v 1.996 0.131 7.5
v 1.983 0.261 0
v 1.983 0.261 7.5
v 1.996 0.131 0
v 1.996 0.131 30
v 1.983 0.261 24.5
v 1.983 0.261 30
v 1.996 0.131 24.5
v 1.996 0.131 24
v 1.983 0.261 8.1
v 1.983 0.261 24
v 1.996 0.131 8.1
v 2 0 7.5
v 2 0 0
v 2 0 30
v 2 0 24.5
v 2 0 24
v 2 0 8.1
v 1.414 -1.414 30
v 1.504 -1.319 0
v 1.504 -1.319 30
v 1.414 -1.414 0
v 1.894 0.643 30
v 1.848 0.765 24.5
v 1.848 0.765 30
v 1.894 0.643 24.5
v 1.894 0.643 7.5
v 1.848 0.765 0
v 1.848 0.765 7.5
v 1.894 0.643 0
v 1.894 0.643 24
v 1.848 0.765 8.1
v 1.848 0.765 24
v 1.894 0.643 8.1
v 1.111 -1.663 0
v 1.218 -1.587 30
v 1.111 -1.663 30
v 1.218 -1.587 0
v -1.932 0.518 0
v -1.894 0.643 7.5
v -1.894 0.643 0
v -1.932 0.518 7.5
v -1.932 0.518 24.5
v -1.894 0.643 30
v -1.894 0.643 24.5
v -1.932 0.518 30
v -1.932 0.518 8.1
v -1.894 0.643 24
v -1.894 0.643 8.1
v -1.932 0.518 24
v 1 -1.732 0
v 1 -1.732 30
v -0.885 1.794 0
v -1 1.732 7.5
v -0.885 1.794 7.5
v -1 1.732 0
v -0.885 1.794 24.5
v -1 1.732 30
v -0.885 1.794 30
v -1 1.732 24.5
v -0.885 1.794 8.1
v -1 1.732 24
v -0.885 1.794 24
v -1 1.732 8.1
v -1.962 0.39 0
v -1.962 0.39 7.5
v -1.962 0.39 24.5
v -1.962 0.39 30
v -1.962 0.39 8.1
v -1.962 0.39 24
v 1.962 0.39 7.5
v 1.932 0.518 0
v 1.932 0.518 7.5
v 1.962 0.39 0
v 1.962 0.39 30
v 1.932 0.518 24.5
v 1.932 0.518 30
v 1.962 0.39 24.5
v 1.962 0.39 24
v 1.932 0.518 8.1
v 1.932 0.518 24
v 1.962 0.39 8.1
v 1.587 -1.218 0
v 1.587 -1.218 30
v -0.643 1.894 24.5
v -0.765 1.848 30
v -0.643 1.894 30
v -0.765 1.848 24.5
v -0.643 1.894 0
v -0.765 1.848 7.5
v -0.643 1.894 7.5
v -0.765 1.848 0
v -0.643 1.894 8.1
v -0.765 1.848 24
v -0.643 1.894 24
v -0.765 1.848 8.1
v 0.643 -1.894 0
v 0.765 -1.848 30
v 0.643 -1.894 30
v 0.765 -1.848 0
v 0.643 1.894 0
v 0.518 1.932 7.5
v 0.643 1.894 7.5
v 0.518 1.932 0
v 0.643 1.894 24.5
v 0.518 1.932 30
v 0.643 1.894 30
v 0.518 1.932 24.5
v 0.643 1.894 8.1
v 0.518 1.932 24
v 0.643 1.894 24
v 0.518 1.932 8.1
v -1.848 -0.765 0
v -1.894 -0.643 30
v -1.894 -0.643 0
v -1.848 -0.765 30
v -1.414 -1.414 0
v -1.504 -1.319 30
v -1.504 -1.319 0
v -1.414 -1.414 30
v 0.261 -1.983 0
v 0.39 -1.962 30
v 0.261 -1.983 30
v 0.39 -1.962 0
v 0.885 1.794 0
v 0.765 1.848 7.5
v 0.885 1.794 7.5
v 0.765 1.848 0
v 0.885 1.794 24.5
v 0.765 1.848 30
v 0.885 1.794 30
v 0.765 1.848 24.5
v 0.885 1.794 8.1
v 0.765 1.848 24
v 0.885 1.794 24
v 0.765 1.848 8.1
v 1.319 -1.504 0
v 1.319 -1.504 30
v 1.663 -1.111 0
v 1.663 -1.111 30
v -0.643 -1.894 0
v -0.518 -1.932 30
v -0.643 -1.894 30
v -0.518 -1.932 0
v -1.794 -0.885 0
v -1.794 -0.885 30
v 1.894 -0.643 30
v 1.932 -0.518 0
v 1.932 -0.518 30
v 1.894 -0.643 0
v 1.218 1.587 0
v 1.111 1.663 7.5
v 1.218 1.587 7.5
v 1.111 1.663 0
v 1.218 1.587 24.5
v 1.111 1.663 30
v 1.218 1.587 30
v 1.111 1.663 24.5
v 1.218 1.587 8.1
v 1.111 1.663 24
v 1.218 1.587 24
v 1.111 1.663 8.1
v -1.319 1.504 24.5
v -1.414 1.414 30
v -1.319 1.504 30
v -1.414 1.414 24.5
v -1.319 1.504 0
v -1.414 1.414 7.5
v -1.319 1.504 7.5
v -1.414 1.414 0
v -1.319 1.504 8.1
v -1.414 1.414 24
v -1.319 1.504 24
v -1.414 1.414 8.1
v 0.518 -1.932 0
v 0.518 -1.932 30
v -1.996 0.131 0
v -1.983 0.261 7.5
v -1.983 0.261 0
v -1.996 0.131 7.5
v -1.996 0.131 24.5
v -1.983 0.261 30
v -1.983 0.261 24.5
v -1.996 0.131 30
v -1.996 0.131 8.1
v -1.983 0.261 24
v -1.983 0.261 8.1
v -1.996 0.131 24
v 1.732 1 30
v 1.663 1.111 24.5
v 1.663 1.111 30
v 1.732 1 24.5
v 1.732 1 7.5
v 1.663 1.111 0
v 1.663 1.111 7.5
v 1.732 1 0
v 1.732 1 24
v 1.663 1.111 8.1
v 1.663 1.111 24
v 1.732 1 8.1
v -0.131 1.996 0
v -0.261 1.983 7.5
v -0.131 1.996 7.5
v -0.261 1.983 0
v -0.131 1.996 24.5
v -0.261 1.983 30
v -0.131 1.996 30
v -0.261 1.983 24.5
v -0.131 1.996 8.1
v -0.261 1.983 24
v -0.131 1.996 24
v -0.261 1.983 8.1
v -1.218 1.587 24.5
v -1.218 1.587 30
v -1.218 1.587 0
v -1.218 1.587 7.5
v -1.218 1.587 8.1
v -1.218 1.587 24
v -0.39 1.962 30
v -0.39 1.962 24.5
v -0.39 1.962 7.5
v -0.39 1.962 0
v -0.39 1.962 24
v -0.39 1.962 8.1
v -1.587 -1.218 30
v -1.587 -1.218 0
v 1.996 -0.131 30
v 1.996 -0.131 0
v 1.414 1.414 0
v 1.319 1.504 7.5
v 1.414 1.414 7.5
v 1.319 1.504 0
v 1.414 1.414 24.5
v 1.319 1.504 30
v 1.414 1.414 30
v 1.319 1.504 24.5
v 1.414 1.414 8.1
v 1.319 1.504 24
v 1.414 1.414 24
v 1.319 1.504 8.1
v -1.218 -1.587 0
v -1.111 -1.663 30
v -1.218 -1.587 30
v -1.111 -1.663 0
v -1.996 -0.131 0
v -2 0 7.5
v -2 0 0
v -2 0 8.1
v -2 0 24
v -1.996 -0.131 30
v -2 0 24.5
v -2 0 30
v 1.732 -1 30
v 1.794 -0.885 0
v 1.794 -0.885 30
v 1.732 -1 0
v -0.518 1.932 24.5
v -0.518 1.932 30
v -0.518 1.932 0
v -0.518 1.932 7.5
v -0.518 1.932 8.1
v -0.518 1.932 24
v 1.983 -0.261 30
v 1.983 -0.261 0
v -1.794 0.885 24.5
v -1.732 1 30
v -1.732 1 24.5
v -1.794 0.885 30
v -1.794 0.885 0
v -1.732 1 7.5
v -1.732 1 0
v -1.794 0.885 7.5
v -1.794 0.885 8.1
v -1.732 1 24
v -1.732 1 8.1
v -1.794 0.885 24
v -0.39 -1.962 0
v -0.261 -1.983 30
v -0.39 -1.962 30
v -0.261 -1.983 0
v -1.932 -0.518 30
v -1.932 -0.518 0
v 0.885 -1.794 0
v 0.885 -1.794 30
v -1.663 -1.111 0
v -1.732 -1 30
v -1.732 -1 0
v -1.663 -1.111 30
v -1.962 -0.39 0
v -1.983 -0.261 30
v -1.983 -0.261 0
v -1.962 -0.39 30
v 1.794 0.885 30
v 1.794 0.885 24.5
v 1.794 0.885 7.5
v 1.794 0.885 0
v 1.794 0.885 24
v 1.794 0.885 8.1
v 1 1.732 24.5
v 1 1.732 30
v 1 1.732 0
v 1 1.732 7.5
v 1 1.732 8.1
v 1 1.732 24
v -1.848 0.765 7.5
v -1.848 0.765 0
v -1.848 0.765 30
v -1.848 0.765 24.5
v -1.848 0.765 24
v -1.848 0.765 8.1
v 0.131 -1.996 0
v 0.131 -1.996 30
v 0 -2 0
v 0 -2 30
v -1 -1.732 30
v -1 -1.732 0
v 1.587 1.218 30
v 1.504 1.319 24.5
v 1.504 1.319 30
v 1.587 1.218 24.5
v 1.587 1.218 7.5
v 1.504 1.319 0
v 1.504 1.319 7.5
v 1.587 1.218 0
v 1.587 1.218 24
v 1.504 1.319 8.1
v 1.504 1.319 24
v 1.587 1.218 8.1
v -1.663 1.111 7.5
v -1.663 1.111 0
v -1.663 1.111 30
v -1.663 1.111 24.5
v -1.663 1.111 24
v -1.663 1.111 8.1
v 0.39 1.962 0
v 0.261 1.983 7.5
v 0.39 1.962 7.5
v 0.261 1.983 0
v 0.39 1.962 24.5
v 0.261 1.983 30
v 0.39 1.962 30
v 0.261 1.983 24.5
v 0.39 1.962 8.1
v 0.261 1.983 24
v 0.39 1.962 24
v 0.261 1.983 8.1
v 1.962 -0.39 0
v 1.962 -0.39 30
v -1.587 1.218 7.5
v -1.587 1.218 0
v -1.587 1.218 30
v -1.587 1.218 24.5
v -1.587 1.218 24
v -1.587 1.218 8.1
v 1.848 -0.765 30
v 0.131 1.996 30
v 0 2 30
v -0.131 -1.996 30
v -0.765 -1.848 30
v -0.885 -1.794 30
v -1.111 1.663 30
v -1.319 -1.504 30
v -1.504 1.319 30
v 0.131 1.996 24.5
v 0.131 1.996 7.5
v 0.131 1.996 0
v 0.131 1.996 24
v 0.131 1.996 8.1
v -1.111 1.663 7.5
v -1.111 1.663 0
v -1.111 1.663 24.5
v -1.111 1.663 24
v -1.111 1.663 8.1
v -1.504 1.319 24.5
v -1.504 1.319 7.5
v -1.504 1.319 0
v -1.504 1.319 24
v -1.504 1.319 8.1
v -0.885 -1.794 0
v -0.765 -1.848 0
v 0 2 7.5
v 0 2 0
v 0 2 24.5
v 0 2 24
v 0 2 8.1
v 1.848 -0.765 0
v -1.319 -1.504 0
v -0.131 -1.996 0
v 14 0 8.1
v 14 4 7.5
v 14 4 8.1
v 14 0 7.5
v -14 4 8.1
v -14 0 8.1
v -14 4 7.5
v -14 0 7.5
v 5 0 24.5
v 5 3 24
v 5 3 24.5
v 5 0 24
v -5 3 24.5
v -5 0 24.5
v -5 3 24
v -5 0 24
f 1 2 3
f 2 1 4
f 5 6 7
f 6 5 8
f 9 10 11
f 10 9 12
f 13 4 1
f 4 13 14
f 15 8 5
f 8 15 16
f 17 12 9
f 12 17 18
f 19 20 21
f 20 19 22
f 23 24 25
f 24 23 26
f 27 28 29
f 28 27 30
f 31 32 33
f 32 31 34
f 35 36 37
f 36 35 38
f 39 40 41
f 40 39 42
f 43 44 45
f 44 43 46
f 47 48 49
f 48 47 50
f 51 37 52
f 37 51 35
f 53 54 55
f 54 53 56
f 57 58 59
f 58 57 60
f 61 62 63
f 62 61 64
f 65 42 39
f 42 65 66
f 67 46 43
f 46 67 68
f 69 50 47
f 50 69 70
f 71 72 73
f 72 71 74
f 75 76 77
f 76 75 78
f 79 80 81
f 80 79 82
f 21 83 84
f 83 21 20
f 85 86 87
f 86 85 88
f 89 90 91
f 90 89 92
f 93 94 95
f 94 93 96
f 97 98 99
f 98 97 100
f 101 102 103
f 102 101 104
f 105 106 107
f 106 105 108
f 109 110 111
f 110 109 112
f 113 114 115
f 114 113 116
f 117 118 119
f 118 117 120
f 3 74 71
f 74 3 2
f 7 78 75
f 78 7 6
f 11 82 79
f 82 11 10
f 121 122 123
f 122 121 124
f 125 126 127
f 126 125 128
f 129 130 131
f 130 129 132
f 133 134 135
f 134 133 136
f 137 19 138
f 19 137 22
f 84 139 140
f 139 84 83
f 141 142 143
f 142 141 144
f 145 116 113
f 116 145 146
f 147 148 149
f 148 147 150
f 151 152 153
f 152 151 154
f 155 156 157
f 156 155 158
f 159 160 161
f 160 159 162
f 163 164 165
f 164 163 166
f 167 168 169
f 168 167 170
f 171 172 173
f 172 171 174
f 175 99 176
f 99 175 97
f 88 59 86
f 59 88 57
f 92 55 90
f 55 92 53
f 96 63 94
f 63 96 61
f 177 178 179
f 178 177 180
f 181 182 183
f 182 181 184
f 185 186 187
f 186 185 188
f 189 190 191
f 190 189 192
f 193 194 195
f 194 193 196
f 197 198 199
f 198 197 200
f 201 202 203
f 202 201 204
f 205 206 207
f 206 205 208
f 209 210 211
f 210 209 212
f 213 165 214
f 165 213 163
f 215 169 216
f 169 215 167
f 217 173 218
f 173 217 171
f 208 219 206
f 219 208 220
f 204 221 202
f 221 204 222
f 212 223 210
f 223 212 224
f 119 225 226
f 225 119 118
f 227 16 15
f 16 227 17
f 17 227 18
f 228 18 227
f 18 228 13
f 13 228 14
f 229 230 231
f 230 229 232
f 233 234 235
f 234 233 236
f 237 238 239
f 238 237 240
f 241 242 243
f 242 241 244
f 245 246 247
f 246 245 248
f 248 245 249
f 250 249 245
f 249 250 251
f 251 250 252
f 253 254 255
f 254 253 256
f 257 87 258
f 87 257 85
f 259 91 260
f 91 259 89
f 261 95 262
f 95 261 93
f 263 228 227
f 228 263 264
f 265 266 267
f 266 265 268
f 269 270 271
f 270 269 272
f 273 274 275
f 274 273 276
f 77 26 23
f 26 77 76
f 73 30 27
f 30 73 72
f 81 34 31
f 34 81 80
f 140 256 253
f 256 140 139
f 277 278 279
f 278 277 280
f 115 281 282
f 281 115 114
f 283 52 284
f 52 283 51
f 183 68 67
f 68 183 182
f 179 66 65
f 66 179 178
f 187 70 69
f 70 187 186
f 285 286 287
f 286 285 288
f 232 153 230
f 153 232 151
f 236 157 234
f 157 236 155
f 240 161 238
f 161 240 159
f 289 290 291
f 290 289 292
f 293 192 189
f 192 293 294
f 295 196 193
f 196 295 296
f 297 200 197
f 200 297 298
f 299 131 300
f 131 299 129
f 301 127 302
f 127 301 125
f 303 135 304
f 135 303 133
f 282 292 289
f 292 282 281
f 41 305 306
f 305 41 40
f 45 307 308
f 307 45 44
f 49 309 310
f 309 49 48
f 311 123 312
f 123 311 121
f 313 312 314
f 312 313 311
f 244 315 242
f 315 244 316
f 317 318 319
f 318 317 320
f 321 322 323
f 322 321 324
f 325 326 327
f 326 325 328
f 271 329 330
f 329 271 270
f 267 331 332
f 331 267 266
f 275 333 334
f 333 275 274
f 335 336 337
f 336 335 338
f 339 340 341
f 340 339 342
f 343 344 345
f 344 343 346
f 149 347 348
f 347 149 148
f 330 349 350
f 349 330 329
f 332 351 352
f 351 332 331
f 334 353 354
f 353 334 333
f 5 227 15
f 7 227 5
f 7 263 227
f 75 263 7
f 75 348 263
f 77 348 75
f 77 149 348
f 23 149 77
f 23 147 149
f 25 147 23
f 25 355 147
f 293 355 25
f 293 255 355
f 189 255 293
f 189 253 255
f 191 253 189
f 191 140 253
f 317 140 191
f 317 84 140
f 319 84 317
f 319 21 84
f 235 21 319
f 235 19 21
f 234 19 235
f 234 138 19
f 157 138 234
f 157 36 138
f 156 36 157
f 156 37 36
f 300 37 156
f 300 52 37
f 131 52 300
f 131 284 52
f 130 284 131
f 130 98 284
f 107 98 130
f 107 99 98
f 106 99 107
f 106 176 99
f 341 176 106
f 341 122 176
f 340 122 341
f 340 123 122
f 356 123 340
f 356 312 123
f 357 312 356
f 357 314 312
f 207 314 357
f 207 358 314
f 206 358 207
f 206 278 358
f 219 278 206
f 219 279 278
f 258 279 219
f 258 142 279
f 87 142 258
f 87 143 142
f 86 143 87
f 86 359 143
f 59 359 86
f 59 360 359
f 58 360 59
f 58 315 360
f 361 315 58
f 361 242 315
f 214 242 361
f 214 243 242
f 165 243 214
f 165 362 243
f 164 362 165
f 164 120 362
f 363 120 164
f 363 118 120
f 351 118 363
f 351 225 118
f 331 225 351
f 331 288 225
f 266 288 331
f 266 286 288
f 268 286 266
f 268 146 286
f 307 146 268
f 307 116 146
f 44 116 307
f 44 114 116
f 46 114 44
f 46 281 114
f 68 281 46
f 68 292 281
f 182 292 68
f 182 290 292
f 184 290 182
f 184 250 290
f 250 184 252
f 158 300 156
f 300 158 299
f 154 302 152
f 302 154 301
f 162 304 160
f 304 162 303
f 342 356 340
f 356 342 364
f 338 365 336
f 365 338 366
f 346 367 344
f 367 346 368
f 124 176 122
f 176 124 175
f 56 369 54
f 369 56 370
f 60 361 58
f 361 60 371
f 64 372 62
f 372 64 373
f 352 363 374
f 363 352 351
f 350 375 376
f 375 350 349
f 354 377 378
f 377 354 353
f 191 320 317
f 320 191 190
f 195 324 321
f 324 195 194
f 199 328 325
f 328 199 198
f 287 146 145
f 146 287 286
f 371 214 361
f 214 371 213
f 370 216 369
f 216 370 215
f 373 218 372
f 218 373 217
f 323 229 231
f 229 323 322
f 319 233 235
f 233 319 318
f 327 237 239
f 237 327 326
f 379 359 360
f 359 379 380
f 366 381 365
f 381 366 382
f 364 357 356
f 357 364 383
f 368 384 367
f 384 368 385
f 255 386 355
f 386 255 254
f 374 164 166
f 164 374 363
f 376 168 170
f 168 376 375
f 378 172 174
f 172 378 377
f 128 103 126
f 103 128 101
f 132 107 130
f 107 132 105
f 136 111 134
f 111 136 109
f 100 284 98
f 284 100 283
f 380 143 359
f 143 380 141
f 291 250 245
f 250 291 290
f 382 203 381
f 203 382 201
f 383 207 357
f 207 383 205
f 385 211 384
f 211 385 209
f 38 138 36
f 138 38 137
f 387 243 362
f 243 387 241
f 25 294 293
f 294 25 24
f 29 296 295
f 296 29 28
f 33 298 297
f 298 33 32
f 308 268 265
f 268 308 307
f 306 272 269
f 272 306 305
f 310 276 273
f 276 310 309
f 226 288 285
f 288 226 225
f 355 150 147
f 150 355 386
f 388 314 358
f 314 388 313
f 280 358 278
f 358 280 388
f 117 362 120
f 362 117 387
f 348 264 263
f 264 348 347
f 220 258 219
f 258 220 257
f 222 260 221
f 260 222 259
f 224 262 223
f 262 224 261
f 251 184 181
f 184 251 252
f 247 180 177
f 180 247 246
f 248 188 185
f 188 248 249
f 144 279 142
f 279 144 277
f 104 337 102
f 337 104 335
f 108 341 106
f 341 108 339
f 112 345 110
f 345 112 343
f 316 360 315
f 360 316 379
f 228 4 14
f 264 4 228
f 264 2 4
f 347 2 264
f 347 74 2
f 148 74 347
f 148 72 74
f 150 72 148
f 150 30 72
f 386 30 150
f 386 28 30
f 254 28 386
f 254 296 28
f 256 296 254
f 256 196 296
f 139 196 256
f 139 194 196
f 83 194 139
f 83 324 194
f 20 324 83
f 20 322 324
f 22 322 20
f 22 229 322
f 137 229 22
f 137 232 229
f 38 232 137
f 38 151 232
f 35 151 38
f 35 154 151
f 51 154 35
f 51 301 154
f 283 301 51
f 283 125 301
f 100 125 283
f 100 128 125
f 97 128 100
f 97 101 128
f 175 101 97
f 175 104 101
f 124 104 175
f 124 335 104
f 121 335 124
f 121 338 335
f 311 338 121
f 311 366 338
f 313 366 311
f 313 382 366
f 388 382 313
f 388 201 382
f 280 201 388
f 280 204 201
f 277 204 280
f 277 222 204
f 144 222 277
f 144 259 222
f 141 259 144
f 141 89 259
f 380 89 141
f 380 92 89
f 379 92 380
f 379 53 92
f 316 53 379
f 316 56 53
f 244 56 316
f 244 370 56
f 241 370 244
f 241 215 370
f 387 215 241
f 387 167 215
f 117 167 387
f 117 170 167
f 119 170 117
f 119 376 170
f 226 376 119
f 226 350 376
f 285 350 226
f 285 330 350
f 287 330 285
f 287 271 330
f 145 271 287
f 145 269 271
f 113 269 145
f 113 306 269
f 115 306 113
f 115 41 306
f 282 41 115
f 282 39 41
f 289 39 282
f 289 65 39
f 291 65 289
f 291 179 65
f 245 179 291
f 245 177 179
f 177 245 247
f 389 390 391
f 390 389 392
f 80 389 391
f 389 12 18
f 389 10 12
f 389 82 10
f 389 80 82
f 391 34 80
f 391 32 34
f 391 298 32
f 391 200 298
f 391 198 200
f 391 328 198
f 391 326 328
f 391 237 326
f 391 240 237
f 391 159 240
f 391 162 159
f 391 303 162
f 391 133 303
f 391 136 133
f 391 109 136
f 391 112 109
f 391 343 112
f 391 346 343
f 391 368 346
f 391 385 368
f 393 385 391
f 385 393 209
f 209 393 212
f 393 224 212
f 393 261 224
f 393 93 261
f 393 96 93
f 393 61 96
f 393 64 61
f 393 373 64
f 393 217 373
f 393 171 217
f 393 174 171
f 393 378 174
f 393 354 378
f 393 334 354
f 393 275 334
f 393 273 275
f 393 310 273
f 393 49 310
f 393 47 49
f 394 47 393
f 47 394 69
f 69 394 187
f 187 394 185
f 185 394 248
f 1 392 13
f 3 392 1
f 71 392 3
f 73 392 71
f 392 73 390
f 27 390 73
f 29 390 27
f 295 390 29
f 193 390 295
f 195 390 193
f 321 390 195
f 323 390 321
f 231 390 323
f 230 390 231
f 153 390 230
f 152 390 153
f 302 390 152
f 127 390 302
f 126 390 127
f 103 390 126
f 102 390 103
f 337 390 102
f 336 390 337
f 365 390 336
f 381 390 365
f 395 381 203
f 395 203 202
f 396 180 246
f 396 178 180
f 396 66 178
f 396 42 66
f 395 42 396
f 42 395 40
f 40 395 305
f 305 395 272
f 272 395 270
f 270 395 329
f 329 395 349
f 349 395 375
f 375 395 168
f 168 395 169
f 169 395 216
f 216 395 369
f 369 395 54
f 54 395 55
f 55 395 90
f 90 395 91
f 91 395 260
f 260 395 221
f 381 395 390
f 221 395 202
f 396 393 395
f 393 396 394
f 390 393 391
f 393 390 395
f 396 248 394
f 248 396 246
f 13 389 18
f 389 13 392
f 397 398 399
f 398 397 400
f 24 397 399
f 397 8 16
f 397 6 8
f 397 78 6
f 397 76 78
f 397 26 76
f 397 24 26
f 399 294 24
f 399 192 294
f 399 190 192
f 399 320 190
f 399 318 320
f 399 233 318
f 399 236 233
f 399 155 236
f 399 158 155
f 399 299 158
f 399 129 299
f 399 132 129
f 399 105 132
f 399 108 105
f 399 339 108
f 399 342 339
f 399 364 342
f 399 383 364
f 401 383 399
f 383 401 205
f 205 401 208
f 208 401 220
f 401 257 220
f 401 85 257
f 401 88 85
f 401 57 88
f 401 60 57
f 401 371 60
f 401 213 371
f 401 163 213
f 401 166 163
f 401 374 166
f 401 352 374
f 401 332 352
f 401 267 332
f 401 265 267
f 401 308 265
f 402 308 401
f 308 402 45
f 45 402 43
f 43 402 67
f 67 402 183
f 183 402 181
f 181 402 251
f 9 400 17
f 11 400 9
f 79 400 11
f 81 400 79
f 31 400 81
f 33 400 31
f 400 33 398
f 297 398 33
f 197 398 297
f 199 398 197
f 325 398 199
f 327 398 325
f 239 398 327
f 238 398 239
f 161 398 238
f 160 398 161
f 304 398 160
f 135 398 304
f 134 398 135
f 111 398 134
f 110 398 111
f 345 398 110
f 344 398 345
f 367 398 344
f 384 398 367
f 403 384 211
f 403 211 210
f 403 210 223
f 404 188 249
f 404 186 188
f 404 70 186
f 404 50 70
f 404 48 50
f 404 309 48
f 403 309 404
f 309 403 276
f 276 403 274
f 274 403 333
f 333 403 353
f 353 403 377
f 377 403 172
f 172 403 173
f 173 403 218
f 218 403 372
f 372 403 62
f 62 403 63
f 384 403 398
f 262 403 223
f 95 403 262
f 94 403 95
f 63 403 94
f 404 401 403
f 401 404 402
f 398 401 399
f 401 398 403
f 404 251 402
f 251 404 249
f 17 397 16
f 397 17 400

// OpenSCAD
// MAXIMAL AGENT-GENERATED CAD MODEL
// Generated by capability-discovery test

$fn = 96;

// Fuselage
module fuselage() {
    cylinder(h=30, r=2);
}

// Wing
module wing() {
    translate([-14.0, 0, 7.5])
        cube([28, 4, 0.6]);
}

// Tail
module tail() {
    translate([-5.0, 0, 24.0])
        cube([10, 3, 0.5]);
}

union() {
    fuselage();
    wing();
    tail();
}
